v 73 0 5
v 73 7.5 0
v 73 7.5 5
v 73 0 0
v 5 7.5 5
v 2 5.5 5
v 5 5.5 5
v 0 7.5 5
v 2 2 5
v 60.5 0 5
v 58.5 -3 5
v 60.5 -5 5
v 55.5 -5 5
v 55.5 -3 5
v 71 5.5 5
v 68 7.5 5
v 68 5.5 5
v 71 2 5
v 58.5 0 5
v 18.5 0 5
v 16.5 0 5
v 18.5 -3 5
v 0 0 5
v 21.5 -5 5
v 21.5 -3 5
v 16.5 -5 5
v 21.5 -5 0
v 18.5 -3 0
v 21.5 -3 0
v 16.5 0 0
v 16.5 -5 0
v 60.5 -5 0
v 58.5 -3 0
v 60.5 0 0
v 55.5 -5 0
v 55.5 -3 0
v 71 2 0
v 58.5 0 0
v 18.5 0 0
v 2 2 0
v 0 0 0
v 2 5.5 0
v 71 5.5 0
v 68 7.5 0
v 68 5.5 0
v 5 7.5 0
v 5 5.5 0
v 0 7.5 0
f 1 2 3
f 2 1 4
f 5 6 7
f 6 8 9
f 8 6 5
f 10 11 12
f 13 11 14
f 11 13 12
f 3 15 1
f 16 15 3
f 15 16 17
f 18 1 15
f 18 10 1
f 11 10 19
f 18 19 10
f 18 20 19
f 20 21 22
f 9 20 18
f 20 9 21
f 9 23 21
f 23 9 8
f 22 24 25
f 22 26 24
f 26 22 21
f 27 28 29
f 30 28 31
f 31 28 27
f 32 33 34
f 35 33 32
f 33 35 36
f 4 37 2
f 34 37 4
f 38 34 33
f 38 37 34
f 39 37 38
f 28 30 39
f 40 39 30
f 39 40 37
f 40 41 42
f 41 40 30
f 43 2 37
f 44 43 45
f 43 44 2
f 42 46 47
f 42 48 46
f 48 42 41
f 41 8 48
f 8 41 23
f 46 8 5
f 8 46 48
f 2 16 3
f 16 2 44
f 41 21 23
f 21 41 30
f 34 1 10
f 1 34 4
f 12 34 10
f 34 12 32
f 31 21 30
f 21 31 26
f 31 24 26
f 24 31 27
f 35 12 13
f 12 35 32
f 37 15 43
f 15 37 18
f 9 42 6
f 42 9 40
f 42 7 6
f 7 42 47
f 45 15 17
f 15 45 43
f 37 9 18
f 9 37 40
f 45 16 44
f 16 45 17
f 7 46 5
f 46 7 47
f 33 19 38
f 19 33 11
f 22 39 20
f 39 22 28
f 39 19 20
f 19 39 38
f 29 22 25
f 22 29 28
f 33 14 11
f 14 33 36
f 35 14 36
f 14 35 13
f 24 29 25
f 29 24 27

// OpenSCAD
platform_thickness = 3;
platform_width = 40;

arduino_heigth = 3.5;
arduino_length = 69;

clip_thickness = 2;
clip_width = 5;

hook_length = 3;

offset = (arduino_length+2*clip_thickness-platform_width)/2;

difference()
{
	union()
	{
		cube([	arduino_length+2*clip_thickness,
				arduino_heigth+2*clip_thickness,
				clip_width]);

		translate([offset,
					0-platform_thickness-clip_thickness,
					0])
			cube([	platform_width+2*clip_thickness,
					platform_thickness+clip_thickness,
					clip_width]);
	}

	translate([clip_thickness,clip_thickness,0])
		cube([	arduino_length,
				arduino_heigth,
				clip_width]);

	translate([clip_thickness+hook_length,clip_thickness+arduino_heigth,0])
		cube([	arduino_length-2*hook_length,
				arduino_heigth,
				clip_width]);

	translate([offset+clip_thickness,0-platform_thickness,0])
		cube([	platform_width,
				platform_thickness,
				clip_width]);

	translate([	offset+clip_thickness+hook_length,
				0-platform_thickness-clip_thickness,
				0])
		cube([	platform_width-2*hook_length,
				platform_thickness,
				clip_width]);
}
